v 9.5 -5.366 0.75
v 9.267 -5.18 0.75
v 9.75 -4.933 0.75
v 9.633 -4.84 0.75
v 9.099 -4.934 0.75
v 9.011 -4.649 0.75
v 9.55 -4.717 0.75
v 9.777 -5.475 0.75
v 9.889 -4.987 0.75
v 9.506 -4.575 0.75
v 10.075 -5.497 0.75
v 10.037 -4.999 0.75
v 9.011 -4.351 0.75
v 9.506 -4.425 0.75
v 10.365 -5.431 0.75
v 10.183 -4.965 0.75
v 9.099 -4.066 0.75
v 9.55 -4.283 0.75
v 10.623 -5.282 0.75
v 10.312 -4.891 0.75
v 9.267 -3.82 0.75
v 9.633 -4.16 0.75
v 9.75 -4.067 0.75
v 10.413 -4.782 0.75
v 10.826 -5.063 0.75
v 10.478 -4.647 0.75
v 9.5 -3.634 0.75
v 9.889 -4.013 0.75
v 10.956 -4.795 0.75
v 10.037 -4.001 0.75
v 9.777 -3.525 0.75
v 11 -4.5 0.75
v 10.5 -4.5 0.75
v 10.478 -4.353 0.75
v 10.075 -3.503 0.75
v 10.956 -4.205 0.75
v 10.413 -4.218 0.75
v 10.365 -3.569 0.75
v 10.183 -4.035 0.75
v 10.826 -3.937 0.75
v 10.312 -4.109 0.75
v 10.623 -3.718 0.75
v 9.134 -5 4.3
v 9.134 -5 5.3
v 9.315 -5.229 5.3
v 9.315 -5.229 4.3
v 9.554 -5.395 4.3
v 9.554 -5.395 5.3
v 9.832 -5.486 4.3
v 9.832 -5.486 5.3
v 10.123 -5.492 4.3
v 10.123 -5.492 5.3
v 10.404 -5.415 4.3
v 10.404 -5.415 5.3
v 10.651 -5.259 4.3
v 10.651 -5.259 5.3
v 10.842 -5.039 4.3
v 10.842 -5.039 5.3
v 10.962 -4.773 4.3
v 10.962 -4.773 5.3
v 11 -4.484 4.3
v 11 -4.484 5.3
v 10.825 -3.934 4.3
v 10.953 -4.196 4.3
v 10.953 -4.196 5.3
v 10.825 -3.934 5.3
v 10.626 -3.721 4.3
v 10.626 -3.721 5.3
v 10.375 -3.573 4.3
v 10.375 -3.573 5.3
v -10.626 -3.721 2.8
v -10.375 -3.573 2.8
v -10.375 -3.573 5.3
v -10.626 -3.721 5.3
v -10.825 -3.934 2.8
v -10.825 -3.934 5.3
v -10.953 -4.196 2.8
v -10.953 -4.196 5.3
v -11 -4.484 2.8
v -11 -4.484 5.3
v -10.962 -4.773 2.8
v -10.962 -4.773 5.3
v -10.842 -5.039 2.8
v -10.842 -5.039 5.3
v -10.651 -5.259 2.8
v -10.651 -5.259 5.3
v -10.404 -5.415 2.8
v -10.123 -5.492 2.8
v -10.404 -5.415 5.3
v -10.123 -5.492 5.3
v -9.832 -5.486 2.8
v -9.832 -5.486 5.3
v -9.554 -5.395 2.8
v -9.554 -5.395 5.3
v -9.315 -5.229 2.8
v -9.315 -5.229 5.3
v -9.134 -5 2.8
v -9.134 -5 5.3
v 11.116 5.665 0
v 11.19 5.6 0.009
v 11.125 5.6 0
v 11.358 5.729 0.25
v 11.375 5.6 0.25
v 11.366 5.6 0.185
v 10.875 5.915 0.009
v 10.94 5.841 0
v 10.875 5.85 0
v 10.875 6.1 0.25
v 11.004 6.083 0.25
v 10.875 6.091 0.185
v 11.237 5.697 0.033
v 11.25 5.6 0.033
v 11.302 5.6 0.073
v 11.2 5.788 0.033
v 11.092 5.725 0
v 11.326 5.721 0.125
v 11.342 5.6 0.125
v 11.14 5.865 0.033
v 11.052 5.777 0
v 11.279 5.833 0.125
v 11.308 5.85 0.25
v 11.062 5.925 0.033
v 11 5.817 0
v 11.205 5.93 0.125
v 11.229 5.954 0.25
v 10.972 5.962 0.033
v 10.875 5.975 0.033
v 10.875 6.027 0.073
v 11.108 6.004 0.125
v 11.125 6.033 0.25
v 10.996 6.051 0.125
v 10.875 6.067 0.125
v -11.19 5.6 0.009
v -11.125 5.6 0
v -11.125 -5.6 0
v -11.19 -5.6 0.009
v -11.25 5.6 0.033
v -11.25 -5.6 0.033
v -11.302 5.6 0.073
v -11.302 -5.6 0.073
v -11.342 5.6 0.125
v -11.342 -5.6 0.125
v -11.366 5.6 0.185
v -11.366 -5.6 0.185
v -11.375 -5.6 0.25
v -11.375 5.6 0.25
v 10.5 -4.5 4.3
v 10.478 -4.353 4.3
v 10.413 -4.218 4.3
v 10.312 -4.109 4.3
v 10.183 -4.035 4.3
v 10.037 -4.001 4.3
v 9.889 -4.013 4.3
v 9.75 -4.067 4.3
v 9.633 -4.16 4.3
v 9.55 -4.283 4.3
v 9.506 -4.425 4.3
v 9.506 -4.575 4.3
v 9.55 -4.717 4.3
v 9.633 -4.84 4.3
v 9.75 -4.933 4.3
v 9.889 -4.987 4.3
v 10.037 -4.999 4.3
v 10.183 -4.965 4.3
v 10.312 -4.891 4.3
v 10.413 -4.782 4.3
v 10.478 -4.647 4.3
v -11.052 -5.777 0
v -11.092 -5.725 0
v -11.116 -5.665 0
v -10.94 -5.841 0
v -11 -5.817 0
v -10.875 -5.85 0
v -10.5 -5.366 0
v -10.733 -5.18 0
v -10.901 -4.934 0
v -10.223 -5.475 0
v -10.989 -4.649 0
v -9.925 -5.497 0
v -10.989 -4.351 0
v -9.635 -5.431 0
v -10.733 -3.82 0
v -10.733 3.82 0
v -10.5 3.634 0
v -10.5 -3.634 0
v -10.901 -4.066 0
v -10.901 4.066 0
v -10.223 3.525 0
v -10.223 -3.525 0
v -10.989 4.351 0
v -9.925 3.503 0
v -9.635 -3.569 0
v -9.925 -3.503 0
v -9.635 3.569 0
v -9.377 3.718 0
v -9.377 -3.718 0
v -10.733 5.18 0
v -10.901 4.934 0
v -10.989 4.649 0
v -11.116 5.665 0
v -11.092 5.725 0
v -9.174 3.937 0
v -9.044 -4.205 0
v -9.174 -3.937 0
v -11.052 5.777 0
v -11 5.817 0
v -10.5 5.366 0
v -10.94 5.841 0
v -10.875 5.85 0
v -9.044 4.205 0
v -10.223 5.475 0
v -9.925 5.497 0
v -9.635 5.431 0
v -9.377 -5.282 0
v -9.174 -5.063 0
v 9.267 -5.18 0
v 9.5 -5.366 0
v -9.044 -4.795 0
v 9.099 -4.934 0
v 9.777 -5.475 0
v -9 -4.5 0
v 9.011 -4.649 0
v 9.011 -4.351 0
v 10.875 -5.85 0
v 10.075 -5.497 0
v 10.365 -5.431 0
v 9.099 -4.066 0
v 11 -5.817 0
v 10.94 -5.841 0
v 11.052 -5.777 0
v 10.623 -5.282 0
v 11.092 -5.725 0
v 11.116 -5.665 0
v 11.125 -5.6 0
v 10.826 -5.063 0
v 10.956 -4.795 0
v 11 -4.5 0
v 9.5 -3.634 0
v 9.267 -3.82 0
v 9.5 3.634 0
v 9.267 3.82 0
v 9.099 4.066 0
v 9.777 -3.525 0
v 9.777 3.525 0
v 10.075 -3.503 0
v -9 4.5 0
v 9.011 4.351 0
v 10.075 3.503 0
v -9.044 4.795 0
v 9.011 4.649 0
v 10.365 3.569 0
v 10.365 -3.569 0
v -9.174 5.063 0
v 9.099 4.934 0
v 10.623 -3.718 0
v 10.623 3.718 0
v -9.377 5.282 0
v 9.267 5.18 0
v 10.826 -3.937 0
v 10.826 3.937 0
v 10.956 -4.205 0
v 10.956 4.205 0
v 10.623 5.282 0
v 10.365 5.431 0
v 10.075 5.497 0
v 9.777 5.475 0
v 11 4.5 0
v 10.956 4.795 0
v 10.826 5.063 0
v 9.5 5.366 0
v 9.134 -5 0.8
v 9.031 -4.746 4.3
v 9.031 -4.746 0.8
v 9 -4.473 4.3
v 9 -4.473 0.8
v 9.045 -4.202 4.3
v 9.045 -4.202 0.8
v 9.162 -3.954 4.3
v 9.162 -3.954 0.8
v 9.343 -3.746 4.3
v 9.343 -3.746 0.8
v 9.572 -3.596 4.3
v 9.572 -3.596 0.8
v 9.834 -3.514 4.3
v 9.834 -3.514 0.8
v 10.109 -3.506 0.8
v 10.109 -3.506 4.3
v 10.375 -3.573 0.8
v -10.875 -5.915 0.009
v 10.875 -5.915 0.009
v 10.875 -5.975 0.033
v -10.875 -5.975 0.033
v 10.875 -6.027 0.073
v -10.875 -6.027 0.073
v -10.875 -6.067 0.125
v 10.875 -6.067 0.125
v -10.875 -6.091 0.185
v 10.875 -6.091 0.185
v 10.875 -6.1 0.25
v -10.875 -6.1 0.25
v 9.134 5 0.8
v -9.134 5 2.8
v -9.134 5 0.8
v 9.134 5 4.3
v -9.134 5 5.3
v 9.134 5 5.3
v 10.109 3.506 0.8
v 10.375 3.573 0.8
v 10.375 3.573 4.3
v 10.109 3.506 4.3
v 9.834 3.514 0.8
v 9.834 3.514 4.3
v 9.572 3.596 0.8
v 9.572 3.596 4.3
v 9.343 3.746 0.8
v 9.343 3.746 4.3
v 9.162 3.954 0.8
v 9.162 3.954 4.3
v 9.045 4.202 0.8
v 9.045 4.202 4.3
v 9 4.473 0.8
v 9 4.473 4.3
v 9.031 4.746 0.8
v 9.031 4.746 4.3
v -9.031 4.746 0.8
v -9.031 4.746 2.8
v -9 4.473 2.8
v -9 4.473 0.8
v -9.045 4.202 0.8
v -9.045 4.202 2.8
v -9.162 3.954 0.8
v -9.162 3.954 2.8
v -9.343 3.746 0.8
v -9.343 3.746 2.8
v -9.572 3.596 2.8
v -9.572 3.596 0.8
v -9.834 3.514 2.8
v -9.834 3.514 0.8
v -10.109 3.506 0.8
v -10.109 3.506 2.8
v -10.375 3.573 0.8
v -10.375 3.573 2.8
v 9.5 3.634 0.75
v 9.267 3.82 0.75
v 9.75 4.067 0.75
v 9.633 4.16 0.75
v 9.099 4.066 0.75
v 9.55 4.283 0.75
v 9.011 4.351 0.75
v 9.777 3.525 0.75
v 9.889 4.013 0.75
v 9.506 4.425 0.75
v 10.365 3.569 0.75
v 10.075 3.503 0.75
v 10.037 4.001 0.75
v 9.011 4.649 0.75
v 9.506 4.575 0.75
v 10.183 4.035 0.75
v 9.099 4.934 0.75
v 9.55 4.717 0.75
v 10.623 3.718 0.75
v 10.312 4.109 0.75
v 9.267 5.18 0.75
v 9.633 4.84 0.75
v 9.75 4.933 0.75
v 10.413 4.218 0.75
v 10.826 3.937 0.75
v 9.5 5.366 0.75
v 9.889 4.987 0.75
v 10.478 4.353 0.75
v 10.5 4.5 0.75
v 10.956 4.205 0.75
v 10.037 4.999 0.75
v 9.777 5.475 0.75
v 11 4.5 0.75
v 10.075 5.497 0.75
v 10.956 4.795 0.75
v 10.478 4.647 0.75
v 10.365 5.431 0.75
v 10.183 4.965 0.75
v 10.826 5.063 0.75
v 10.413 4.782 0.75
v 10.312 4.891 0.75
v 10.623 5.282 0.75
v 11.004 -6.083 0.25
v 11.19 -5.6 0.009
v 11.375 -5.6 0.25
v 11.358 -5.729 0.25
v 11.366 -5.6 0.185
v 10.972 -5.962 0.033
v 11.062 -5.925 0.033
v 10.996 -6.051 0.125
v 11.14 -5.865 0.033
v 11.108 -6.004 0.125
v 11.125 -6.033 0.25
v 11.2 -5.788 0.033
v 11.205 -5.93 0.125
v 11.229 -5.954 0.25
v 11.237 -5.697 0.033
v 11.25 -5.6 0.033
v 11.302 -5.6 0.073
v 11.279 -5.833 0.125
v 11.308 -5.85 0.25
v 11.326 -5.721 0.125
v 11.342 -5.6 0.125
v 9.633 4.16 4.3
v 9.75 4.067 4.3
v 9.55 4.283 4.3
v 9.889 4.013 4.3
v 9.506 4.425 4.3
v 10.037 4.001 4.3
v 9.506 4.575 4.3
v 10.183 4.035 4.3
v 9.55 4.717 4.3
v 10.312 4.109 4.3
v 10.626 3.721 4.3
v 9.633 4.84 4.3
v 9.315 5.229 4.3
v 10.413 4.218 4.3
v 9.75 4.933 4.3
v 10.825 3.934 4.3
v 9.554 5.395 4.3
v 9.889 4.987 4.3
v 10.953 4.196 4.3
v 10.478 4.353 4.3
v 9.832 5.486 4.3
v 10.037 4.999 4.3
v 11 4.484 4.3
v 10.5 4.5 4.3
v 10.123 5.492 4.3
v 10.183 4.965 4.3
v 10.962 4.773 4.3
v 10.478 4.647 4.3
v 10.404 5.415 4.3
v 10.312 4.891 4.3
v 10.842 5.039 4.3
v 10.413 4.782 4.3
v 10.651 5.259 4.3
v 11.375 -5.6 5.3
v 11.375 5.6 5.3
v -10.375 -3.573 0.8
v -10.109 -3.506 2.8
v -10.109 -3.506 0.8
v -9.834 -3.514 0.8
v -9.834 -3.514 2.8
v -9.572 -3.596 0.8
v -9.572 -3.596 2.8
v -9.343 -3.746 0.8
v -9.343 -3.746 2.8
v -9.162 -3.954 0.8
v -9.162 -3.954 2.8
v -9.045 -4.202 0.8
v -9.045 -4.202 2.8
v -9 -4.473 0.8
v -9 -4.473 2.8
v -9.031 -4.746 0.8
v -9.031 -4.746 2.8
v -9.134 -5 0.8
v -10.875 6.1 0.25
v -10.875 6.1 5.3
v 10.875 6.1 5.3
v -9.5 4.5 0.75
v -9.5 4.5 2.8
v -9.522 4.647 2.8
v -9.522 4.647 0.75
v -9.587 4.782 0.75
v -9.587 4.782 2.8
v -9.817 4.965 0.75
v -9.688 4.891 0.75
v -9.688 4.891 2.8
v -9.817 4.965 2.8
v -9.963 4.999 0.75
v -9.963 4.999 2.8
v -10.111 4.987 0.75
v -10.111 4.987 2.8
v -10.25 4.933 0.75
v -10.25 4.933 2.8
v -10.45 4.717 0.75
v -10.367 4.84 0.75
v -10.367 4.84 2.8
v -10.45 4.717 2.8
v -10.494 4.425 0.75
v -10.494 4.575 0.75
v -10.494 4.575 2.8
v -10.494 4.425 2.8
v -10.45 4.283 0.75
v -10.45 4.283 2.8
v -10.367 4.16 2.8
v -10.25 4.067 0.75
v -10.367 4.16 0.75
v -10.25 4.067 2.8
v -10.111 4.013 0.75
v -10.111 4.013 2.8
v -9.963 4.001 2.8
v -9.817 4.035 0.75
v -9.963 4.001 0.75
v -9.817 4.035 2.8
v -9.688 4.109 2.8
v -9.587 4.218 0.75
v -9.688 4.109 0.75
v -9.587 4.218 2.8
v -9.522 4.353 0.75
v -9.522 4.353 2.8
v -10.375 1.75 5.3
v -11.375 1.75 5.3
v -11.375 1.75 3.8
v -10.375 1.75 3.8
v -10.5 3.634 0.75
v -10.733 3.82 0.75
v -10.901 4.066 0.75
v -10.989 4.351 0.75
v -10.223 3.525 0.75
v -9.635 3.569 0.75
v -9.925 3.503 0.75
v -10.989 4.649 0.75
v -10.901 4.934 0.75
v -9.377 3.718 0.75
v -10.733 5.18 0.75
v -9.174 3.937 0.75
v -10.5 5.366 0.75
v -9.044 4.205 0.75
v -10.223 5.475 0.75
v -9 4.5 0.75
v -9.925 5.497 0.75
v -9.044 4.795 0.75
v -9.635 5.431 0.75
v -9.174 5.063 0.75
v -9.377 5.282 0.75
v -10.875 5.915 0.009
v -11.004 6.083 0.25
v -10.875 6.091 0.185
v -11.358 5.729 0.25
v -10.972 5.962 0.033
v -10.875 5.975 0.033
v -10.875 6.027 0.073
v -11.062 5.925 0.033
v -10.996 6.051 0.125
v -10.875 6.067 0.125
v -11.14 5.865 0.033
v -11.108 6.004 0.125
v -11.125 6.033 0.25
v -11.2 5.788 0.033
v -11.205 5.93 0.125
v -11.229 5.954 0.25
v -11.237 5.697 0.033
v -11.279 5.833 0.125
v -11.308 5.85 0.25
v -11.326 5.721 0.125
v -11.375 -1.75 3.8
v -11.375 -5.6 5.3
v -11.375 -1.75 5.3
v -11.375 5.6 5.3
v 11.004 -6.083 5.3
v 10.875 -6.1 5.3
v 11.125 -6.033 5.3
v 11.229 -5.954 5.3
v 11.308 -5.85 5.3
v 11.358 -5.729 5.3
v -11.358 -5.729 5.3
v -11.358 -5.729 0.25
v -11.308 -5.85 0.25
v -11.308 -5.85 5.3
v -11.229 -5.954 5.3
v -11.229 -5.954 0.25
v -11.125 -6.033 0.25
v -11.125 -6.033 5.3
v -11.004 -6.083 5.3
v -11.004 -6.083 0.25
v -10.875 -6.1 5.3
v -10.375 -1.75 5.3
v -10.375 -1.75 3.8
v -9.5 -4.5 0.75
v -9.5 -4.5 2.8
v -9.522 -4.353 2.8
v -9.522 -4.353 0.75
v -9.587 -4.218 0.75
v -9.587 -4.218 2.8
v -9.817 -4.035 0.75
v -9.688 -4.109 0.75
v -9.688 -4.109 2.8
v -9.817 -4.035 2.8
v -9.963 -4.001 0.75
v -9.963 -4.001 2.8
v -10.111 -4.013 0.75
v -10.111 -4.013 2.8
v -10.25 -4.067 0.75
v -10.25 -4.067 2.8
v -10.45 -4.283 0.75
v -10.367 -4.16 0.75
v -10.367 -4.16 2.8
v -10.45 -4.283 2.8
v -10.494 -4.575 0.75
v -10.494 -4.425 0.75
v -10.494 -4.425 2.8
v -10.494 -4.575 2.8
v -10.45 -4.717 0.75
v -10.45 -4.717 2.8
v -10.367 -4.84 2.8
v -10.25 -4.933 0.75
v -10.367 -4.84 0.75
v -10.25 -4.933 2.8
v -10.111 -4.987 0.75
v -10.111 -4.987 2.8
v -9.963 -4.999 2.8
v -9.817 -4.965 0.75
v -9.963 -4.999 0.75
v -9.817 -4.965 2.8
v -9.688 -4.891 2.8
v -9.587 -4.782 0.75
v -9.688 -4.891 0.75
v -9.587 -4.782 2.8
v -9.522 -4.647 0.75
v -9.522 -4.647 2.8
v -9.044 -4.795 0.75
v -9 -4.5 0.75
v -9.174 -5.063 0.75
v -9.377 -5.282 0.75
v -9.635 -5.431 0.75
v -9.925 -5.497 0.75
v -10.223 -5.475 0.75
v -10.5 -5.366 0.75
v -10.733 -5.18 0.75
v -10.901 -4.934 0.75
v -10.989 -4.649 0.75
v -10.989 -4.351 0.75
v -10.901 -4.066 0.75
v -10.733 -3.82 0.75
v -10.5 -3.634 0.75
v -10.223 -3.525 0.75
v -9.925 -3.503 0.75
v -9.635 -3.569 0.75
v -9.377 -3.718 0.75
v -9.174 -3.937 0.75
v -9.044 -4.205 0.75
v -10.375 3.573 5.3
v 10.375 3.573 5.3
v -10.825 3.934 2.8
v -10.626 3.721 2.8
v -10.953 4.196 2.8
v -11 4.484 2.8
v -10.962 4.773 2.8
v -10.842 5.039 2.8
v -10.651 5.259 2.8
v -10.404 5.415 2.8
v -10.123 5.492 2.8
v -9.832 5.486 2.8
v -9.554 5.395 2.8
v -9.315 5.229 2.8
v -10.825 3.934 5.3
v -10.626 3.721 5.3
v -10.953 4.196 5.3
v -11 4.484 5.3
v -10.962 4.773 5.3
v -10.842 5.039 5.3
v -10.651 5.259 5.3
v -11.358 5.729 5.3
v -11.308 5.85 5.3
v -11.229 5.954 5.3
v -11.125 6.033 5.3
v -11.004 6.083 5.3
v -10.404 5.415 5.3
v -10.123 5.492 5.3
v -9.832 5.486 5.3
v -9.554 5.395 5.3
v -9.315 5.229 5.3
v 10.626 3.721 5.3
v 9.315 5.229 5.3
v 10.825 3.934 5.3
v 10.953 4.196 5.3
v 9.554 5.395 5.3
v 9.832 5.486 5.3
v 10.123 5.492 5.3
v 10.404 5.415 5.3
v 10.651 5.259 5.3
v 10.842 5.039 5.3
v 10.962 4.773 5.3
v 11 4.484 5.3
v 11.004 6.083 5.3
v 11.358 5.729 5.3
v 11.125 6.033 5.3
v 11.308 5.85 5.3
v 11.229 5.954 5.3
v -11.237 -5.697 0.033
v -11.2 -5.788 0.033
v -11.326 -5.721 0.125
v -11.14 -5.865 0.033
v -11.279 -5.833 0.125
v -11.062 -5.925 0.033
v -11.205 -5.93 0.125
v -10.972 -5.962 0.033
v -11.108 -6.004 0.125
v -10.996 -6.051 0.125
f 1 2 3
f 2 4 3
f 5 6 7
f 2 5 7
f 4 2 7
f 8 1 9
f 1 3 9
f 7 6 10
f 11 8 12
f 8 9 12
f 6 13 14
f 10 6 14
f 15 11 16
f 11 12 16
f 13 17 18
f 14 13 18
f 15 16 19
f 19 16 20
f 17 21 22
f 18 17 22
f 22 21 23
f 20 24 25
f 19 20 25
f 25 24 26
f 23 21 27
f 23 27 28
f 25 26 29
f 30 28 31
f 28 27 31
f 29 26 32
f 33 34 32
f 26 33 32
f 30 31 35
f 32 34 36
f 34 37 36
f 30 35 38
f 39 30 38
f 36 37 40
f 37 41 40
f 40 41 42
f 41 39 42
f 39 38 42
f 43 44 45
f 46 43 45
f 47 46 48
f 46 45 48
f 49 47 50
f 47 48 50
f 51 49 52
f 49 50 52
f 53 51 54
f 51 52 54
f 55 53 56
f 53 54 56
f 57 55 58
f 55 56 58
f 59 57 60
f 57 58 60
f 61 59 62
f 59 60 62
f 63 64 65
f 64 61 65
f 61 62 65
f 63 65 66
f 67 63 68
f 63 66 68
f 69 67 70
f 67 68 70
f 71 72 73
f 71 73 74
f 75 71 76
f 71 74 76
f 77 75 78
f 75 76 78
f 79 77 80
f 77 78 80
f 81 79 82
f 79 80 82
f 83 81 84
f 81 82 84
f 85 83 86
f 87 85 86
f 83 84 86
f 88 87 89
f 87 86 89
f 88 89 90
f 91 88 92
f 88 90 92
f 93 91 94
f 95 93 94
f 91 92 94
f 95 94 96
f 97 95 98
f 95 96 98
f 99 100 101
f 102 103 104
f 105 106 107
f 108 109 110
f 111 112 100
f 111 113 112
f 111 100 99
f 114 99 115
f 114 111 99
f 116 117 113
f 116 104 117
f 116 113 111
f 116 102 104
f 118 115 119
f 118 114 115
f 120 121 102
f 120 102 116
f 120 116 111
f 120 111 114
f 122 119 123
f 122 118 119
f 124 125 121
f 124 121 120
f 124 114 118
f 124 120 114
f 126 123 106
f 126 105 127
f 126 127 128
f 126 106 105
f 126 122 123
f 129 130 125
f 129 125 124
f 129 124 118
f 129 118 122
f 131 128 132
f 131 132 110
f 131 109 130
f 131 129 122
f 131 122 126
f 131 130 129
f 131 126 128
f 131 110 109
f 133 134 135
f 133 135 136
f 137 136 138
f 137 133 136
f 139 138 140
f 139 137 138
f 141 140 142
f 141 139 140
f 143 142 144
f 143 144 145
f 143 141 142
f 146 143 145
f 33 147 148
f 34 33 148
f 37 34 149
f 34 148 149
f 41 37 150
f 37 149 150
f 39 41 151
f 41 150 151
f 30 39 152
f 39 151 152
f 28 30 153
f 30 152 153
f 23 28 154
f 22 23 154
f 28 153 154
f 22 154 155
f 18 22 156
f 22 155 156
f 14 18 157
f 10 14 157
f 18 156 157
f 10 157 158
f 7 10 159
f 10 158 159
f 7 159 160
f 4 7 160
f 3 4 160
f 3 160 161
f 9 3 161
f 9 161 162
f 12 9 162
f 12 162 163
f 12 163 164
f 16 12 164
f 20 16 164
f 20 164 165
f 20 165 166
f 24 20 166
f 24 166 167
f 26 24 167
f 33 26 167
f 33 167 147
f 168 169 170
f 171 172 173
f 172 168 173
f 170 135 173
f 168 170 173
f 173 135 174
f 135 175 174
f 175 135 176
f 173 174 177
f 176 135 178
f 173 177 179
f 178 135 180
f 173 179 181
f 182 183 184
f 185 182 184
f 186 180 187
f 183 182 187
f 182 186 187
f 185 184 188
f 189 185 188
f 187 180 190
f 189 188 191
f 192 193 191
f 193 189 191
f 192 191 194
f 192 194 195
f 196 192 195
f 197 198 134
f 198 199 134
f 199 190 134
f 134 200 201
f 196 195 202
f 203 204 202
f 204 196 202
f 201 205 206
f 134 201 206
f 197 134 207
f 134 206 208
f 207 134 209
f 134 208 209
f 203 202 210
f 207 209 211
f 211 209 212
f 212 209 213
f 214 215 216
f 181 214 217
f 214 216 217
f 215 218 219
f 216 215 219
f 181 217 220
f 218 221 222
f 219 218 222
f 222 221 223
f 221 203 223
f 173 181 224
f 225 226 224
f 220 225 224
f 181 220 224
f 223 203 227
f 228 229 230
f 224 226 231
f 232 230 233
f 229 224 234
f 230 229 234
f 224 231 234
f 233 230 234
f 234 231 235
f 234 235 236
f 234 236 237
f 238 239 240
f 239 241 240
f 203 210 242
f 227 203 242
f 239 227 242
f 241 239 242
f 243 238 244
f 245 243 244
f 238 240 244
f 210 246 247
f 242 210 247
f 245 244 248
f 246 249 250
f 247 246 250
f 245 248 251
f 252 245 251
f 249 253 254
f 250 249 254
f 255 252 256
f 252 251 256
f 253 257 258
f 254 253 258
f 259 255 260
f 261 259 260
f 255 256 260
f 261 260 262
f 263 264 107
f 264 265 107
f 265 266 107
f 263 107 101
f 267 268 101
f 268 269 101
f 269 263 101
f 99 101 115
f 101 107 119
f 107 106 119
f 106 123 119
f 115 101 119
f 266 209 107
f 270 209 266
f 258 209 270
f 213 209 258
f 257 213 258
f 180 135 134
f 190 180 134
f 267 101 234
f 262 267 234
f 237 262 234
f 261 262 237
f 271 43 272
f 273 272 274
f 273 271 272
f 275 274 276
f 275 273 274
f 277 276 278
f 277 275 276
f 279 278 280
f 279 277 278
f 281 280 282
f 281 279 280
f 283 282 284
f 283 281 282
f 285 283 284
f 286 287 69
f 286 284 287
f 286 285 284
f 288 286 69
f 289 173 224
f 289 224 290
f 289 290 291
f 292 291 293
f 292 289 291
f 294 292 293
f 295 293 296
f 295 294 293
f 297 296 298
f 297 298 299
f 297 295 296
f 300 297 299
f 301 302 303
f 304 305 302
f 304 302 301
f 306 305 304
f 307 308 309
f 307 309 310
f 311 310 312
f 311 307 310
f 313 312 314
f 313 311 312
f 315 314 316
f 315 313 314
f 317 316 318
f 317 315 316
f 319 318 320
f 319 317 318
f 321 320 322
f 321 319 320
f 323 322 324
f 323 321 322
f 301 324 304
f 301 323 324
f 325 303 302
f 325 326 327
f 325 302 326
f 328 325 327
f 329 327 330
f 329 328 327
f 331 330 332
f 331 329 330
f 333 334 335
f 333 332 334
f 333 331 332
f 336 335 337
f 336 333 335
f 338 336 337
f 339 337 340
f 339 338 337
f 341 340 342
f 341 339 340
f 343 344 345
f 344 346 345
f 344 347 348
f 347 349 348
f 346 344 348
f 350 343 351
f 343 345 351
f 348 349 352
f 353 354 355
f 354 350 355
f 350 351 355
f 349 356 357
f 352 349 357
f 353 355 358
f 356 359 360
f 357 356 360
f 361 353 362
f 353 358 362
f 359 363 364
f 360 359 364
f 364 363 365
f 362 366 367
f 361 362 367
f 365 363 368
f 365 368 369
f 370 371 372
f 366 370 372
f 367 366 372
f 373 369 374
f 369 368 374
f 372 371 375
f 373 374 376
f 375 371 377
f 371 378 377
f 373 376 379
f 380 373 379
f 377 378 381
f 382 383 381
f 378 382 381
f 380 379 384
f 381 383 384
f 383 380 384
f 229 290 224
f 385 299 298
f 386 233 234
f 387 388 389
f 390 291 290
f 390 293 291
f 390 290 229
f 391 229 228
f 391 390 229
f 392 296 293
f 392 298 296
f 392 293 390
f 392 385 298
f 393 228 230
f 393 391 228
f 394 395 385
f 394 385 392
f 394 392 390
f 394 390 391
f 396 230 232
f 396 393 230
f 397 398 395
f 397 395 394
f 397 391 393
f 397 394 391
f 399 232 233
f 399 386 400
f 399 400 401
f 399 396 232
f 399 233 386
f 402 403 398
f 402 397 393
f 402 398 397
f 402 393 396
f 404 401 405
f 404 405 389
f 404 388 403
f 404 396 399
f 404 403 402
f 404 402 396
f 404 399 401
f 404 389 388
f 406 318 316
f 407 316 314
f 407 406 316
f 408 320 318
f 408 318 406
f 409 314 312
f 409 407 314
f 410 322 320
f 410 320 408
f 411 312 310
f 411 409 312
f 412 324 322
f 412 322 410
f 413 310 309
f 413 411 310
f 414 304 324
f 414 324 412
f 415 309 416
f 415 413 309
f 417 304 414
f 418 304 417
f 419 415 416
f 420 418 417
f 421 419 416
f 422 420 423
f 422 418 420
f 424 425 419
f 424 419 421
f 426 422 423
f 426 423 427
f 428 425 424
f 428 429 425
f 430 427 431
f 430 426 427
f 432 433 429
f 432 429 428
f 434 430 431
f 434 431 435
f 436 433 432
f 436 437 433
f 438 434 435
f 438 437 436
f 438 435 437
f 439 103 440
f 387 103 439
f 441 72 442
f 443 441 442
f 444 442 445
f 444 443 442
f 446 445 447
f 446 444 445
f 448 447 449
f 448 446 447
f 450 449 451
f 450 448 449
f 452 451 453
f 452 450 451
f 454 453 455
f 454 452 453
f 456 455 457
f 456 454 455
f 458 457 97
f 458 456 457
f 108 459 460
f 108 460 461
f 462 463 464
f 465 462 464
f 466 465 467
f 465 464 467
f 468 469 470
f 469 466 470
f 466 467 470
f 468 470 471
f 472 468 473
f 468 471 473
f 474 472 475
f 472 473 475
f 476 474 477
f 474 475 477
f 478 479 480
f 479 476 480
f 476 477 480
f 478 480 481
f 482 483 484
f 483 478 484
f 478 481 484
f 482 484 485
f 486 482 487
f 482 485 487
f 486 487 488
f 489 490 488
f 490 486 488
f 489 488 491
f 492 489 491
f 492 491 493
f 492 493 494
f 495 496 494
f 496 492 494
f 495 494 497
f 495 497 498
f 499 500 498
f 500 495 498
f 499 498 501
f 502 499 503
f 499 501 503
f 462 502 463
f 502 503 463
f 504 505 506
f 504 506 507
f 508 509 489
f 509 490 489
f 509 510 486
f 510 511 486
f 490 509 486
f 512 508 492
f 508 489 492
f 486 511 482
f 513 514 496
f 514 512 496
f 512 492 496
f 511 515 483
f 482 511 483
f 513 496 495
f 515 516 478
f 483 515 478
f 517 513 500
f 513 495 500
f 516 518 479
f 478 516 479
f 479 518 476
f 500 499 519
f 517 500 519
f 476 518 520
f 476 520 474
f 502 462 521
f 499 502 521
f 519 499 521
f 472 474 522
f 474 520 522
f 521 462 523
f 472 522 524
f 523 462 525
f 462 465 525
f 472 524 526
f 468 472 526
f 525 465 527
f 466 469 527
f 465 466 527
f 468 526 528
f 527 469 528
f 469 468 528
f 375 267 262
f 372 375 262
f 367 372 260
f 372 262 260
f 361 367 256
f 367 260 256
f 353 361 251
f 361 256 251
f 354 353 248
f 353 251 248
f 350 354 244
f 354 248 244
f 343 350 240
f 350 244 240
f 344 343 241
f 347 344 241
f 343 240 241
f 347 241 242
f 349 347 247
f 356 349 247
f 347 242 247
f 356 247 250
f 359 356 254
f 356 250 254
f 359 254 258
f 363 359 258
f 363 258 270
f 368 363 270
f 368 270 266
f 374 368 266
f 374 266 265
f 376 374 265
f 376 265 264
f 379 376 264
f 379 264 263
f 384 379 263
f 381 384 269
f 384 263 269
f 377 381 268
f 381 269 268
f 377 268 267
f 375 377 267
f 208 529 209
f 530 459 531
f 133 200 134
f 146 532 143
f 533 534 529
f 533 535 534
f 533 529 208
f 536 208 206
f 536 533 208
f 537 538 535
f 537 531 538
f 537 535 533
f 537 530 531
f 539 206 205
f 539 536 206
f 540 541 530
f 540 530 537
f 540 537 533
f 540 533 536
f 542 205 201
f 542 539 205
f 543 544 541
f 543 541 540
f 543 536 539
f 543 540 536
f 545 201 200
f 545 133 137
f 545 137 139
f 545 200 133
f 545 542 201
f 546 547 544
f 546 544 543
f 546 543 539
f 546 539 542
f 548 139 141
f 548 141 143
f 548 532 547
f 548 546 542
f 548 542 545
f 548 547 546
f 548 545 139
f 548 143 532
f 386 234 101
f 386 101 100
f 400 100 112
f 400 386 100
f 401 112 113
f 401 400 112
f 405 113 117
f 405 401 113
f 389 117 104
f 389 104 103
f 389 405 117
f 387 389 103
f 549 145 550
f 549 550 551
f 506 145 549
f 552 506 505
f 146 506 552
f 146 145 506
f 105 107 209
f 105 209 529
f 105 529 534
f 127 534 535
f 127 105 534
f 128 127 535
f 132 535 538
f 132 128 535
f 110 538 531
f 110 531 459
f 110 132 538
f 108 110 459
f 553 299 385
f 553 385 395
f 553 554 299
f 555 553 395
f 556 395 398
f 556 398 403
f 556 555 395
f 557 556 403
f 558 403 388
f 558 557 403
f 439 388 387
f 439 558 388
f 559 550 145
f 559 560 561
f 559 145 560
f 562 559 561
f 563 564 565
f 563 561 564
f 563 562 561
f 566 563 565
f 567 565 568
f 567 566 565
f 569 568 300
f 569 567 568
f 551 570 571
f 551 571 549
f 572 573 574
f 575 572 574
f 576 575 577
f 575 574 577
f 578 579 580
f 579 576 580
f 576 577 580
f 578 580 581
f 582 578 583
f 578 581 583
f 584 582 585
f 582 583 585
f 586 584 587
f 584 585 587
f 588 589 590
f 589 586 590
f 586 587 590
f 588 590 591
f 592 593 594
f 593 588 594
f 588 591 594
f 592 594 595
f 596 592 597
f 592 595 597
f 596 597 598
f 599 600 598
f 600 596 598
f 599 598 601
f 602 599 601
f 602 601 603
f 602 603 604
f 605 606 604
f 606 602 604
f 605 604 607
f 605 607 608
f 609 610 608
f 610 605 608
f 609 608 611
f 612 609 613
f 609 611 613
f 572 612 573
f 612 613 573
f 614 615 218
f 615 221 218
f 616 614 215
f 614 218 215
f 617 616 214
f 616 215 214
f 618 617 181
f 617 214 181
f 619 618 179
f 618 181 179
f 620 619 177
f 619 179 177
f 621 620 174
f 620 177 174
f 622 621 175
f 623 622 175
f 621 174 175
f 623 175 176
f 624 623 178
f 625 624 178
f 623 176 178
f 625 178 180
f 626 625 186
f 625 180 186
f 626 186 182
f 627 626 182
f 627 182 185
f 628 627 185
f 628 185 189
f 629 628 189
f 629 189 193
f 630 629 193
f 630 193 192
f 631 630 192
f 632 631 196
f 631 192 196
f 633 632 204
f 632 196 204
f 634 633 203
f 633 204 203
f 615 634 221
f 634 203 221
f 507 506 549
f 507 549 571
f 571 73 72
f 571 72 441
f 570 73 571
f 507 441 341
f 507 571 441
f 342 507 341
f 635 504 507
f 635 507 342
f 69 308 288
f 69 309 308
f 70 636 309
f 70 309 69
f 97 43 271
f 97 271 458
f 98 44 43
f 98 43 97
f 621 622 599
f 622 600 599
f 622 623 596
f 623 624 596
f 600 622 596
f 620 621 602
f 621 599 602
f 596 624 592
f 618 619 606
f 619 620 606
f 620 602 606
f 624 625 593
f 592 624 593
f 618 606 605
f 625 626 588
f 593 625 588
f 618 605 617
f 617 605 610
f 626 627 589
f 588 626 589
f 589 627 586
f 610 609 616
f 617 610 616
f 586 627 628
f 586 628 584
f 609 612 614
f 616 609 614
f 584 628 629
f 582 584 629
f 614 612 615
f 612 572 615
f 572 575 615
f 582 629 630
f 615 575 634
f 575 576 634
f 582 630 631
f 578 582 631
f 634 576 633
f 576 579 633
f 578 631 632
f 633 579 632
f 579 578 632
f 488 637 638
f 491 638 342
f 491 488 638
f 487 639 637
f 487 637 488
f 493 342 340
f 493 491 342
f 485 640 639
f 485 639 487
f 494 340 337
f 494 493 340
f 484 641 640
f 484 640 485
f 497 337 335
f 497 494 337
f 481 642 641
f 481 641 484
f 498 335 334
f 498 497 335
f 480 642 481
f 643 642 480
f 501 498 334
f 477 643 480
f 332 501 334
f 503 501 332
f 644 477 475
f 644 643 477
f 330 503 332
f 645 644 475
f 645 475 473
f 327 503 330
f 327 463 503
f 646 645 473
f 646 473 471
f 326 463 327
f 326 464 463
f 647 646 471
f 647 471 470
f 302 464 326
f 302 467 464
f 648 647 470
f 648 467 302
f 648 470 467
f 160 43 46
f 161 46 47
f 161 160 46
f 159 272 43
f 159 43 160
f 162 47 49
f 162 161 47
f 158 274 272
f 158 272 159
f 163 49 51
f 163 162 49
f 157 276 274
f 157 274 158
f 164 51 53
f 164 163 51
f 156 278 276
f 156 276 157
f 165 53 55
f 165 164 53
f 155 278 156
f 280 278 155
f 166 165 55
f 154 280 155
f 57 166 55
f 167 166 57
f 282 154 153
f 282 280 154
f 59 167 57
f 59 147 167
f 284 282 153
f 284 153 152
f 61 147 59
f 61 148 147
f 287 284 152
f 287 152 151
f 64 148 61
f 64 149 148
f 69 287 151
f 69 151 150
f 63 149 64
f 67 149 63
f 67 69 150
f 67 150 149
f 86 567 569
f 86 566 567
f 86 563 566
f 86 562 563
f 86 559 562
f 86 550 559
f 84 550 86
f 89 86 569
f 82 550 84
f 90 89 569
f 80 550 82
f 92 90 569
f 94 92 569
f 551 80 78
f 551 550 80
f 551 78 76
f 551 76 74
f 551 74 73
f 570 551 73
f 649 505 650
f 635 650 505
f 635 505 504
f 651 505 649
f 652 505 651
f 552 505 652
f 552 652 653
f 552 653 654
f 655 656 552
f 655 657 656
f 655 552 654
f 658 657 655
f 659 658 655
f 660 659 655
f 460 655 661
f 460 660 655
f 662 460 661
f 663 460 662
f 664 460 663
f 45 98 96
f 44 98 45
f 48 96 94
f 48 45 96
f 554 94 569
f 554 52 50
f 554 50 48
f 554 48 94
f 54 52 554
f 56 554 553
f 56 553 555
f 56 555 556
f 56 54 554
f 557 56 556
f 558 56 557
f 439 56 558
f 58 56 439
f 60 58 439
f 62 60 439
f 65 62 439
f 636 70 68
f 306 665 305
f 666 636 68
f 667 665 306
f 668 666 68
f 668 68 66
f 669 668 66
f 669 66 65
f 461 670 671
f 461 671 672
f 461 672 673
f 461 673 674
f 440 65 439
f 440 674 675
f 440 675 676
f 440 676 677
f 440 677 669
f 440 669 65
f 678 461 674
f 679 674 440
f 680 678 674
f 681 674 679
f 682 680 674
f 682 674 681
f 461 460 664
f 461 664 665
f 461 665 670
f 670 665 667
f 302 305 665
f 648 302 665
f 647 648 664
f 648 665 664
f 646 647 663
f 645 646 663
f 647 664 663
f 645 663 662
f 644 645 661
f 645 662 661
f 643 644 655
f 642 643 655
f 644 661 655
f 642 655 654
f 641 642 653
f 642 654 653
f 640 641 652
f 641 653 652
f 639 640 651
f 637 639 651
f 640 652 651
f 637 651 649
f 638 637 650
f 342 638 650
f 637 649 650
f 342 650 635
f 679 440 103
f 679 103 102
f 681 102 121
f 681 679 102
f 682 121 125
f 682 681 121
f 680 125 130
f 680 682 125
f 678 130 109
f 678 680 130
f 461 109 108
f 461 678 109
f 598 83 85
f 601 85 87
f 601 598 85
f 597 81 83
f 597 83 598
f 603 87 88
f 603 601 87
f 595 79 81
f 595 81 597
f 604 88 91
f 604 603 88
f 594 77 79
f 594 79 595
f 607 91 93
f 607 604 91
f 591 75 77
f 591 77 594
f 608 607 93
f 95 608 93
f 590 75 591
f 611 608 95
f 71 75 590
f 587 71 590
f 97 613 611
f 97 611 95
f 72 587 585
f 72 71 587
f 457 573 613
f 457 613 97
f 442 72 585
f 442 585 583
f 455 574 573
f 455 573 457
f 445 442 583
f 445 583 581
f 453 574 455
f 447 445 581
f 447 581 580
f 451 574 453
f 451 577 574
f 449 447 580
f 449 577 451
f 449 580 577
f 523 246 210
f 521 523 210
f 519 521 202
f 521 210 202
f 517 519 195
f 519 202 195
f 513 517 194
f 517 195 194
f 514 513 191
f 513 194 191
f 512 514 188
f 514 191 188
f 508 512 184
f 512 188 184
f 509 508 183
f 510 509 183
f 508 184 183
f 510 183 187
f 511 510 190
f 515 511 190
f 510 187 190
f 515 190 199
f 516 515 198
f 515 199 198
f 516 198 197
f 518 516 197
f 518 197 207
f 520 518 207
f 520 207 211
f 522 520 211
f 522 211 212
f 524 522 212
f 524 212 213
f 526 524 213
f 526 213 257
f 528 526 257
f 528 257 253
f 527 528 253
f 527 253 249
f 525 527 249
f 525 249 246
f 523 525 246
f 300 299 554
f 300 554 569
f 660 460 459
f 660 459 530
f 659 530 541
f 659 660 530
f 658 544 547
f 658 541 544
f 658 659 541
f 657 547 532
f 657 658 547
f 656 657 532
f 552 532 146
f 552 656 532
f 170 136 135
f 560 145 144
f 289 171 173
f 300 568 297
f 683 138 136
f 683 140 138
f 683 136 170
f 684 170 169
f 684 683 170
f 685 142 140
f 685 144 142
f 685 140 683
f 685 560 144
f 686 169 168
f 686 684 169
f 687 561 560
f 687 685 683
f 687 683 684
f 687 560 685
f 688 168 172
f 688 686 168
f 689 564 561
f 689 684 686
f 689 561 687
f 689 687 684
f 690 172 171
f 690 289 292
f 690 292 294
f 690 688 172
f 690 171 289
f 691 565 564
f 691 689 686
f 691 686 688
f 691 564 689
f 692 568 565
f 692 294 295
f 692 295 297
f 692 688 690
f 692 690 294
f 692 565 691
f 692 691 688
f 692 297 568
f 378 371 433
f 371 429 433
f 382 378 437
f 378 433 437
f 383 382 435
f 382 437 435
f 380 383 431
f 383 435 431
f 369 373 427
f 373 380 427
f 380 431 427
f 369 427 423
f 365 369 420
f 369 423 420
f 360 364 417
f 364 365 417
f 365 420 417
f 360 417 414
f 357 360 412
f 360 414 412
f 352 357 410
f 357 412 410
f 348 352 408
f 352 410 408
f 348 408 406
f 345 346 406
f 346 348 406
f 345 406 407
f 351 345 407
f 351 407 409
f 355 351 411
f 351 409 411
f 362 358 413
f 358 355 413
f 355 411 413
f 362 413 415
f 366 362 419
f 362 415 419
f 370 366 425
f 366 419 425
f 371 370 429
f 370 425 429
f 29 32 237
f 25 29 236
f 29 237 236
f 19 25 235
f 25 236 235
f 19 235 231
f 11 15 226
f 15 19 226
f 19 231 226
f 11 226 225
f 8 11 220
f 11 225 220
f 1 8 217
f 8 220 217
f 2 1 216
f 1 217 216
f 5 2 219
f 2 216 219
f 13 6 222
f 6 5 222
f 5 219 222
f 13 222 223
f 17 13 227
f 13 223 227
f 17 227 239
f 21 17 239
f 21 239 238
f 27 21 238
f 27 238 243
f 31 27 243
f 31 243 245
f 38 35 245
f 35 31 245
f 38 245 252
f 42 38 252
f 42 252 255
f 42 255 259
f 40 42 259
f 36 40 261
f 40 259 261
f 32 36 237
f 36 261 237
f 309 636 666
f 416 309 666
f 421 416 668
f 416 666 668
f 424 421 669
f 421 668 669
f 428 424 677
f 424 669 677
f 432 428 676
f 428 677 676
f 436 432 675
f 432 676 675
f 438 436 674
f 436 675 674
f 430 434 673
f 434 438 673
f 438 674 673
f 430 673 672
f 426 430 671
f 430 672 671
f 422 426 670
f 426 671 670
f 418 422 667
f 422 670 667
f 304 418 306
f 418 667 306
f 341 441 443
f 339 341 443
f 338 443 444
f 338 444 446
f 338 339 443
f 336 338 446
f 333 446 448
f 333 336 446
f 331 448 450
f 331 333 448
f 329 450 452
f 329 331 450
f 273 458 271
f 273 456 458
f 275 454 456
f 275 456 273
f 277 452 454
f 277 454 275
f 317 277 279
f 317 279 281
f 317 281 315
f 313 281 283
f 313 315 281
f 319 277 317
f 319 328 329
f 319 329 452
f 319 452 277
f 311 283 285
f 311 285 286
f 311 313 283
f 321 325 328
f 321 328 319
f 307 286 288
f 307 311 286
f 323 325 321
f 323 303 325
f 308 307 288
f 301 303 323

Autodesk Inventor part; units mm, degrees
ref_plane "YZ Plane" through (0, 0, 0) normal (1, 0, 0) x (0, 1, 0)
ref_plane "XZ Plane" through (0, 0, 0) normal (0, 1, 0) x (-1, 0, 0)
ref_plane "XY Plane" through (0, 0, 0) normal (0, 0, 1) x (1, 0, 0)
sketch "Sketch1" plane through (0, 0, 0) normal (0, 0, 1) x (1, 0, 0)
  line L0 (11.375, -6.1) -> (-11.375, -6.1)
  line L1 (-11.375, -6.1) -> (-11.375, 6.1)
  line L2 (-11.375, 6.1) -> (11.375, 6.1)
  line L3 (11.375, 6.1) -> (11.375, -6.1)
  line L4 (11.375, -6.1) -> (-11.375, 6.1) construction
  line L5 (-11.375, -6.1) -> (11.375, 6.1) construction
  point P0 (0, 0)
  dimension "d0" = 12.2
  dimension "d1" = 22.75
extrude "Extrusion1" add sketch "Sketch1" along normal blind 5.3
fillet "Fillet1" radius 0.5 4 edges at (-11.375, 6.1, 2.65) (-11.375, -6.1, 2.65) (11.375, -6.1, 2.65) (11.375, 6.1, 2.65)
fillet "Fillet1" radius 0.25 4 edges at (0, -6.1, 0) (-11.375, 0, 0) (0, 6.1, 0) (11.375, 0, 0)
sketch "Sketch2" plane through (0, 0, 5.3) normal (0, 0, 1) x (1, 0, 0)
  line L0 (10.375, -5) -> (-10.375, -5)
  line L1 (-10.375, -5) -> (-10.375, 5)
  line L2 (-10.375, 5) -> (10.375, 5)
  line L3 (10.375, 5) -> (10.375, -5)
  line L4 (10.375, -5) -> (-10.375, 5) construction
  line L5 (-10.375, -5) -> (10.375, 5) construction
  line L6 (10.875, 6.1) -> (-10.875, 6.1) projected
  line L7 (-11.375, 5.6) -> (-11.375, -5.6) projected
  line L8 (-11.375, -5.6) -> (-11.375, 5.6) projected
  line L9 (-10.375, -1.75) -> (-11.375, -1.75)
  line L10 (-11.375, -1.75) -> (-11.375, 1.75)
  line L11 (-11.375, 1.75) -> (-10.375, 1.75)
  line L12 (-10.375, 1.75) -> (-10.375, -1.75)
  line L13 (10, -4.5) -> (-10, -4.5) construction
  line L14 (-10, -4.5) -> (-10, 4.5) construction
  line L15 (-10, 4.5) -> (10, 4.5) construction
  line L16 (10, 4.5) -> (10, -4.5) construction
  line L17 (10, -4.5) -> (-10, 4.5) construction
  line L18 (-10, -4.5) -> (10, 4.5) construction
  circle A0 centre (-10, 4.5) radius 0.5
  circle A1 centre (10, 4.5) radius 0.5
  circle A2 centre (-10, -4.5) radius 0.5
  circle A3 centre (10, -4.5) radius 0.5
  circle A4 centre (-10, 4.5) radius 1
  circle A5 centre (10, 4.5) radius 1
  circle A6 centre (-10, -4.5) radius 1
  circle A7 centre (10, -4.5) radius 1
  point P0 (0, 0)
  point P1 (-11.375, 0)
  point P2 (0, 0)
  point P3 (-11.375, 0)
  point P4 (0, 0)
  dimension "d6" = 1.1
  dimension "d7" = 1
  dimension "d8" = 3.5
  dimension "d9" = 20
  dimension "d10" = 9
  dimension "d11" = 1
  dimension "d12" = 2
extrude "Extrusion2" cut sketch "Sketch2" against normal blind 4.5 contours L0 A3 L3 | L0 A7 L3 A3 | A3 L3 | L0 A6 L1 A4 L2 A5 L3 A7 | L0 A2 L1 A6 | L0 L1 A2 | A2 L1 | A5 L2 A1 L3 | A1 L3 | A1 L2 L3 | A4 L1 A0 L2 | A0 L1 L2 | A0 L1 picked at (10.2274, -3.7042) picked at (10.11, -4.5904) picked at (-9.1814, -4.3794) picked at (-10.0833, -4.5) picked at (10.2274, 3.7042) picked at (10.1829, 4.6853) picked at (-9.1814, 4.3794) picked at (-10.0875, 4.5371)
extrude "Extrusion3" cut sketch "Sketch2" against normal through all contours A3 L3 | L3 A3 | A2 L1 | A2 L1 | A1 L3 | L3 A1 | A0 L1 | A0 L1
extrude "Extrusion4" add sketch "Sketch2" along normal blind 2 from surface at -4.5 contours A6 L1 A2 L0 | L0 A2 L1 A6 | L0 L1 A2 | A4 L1 A0 L2 | L2 L1 A0 A4 | A0 L1 L2
extrude "Extrusion5" cut sketch "Sketch2" against normal up to surface (2.5 mm away) contours A6 L1 A2 L0 | L0 A2 L1 A6 | L0 L1 A2 | A4 L1 A0 L2 | L2 L1 A0 A4 | A0 L1 L2
extrude "Extrusion6" add sketch "Sketch2" along normal blind 3.5 from surface at -4.5 contours L3 A3 A7 L0 | L0 A3 L3 | L0 A7 L3 A3 | A5 L2 A1 L3 | L3 A1 L2 A5 | A1 L2 L3
extrude "Extrusion7" cut sketch "Sketch2" against normal up to surface (1 mm away) contours L3 A3 A7 L0 | L0 A3 L3 | L0 A7 L3 A3 | A5 L2 A1 L3 | L3 A1 L2 A5 | A1 L2 L3
extrude "Extrusion8" cut sketch "Sketch2" against normal blind 1.5 contours L9 L7 L11 L1
extrude "Extrusion9" cut sketch "Sketch2" along normal blind 0.75 from surface at -5.3 contours L3 A3 A7 L0 | L0 A3 L3 | L0 A7 L3 A3 | A6 L1 A2 L0 | L0 A2 L1 A6 | L0 L1 A2 | A5 L2 A1 L3 | L3 A1 L2 A5 | A1 L2 L3 | A4 L1 A0 L2 | L2 L1 A0 A4 | A0 L1 L2
properties part number "sevo onder" material "Glass"
